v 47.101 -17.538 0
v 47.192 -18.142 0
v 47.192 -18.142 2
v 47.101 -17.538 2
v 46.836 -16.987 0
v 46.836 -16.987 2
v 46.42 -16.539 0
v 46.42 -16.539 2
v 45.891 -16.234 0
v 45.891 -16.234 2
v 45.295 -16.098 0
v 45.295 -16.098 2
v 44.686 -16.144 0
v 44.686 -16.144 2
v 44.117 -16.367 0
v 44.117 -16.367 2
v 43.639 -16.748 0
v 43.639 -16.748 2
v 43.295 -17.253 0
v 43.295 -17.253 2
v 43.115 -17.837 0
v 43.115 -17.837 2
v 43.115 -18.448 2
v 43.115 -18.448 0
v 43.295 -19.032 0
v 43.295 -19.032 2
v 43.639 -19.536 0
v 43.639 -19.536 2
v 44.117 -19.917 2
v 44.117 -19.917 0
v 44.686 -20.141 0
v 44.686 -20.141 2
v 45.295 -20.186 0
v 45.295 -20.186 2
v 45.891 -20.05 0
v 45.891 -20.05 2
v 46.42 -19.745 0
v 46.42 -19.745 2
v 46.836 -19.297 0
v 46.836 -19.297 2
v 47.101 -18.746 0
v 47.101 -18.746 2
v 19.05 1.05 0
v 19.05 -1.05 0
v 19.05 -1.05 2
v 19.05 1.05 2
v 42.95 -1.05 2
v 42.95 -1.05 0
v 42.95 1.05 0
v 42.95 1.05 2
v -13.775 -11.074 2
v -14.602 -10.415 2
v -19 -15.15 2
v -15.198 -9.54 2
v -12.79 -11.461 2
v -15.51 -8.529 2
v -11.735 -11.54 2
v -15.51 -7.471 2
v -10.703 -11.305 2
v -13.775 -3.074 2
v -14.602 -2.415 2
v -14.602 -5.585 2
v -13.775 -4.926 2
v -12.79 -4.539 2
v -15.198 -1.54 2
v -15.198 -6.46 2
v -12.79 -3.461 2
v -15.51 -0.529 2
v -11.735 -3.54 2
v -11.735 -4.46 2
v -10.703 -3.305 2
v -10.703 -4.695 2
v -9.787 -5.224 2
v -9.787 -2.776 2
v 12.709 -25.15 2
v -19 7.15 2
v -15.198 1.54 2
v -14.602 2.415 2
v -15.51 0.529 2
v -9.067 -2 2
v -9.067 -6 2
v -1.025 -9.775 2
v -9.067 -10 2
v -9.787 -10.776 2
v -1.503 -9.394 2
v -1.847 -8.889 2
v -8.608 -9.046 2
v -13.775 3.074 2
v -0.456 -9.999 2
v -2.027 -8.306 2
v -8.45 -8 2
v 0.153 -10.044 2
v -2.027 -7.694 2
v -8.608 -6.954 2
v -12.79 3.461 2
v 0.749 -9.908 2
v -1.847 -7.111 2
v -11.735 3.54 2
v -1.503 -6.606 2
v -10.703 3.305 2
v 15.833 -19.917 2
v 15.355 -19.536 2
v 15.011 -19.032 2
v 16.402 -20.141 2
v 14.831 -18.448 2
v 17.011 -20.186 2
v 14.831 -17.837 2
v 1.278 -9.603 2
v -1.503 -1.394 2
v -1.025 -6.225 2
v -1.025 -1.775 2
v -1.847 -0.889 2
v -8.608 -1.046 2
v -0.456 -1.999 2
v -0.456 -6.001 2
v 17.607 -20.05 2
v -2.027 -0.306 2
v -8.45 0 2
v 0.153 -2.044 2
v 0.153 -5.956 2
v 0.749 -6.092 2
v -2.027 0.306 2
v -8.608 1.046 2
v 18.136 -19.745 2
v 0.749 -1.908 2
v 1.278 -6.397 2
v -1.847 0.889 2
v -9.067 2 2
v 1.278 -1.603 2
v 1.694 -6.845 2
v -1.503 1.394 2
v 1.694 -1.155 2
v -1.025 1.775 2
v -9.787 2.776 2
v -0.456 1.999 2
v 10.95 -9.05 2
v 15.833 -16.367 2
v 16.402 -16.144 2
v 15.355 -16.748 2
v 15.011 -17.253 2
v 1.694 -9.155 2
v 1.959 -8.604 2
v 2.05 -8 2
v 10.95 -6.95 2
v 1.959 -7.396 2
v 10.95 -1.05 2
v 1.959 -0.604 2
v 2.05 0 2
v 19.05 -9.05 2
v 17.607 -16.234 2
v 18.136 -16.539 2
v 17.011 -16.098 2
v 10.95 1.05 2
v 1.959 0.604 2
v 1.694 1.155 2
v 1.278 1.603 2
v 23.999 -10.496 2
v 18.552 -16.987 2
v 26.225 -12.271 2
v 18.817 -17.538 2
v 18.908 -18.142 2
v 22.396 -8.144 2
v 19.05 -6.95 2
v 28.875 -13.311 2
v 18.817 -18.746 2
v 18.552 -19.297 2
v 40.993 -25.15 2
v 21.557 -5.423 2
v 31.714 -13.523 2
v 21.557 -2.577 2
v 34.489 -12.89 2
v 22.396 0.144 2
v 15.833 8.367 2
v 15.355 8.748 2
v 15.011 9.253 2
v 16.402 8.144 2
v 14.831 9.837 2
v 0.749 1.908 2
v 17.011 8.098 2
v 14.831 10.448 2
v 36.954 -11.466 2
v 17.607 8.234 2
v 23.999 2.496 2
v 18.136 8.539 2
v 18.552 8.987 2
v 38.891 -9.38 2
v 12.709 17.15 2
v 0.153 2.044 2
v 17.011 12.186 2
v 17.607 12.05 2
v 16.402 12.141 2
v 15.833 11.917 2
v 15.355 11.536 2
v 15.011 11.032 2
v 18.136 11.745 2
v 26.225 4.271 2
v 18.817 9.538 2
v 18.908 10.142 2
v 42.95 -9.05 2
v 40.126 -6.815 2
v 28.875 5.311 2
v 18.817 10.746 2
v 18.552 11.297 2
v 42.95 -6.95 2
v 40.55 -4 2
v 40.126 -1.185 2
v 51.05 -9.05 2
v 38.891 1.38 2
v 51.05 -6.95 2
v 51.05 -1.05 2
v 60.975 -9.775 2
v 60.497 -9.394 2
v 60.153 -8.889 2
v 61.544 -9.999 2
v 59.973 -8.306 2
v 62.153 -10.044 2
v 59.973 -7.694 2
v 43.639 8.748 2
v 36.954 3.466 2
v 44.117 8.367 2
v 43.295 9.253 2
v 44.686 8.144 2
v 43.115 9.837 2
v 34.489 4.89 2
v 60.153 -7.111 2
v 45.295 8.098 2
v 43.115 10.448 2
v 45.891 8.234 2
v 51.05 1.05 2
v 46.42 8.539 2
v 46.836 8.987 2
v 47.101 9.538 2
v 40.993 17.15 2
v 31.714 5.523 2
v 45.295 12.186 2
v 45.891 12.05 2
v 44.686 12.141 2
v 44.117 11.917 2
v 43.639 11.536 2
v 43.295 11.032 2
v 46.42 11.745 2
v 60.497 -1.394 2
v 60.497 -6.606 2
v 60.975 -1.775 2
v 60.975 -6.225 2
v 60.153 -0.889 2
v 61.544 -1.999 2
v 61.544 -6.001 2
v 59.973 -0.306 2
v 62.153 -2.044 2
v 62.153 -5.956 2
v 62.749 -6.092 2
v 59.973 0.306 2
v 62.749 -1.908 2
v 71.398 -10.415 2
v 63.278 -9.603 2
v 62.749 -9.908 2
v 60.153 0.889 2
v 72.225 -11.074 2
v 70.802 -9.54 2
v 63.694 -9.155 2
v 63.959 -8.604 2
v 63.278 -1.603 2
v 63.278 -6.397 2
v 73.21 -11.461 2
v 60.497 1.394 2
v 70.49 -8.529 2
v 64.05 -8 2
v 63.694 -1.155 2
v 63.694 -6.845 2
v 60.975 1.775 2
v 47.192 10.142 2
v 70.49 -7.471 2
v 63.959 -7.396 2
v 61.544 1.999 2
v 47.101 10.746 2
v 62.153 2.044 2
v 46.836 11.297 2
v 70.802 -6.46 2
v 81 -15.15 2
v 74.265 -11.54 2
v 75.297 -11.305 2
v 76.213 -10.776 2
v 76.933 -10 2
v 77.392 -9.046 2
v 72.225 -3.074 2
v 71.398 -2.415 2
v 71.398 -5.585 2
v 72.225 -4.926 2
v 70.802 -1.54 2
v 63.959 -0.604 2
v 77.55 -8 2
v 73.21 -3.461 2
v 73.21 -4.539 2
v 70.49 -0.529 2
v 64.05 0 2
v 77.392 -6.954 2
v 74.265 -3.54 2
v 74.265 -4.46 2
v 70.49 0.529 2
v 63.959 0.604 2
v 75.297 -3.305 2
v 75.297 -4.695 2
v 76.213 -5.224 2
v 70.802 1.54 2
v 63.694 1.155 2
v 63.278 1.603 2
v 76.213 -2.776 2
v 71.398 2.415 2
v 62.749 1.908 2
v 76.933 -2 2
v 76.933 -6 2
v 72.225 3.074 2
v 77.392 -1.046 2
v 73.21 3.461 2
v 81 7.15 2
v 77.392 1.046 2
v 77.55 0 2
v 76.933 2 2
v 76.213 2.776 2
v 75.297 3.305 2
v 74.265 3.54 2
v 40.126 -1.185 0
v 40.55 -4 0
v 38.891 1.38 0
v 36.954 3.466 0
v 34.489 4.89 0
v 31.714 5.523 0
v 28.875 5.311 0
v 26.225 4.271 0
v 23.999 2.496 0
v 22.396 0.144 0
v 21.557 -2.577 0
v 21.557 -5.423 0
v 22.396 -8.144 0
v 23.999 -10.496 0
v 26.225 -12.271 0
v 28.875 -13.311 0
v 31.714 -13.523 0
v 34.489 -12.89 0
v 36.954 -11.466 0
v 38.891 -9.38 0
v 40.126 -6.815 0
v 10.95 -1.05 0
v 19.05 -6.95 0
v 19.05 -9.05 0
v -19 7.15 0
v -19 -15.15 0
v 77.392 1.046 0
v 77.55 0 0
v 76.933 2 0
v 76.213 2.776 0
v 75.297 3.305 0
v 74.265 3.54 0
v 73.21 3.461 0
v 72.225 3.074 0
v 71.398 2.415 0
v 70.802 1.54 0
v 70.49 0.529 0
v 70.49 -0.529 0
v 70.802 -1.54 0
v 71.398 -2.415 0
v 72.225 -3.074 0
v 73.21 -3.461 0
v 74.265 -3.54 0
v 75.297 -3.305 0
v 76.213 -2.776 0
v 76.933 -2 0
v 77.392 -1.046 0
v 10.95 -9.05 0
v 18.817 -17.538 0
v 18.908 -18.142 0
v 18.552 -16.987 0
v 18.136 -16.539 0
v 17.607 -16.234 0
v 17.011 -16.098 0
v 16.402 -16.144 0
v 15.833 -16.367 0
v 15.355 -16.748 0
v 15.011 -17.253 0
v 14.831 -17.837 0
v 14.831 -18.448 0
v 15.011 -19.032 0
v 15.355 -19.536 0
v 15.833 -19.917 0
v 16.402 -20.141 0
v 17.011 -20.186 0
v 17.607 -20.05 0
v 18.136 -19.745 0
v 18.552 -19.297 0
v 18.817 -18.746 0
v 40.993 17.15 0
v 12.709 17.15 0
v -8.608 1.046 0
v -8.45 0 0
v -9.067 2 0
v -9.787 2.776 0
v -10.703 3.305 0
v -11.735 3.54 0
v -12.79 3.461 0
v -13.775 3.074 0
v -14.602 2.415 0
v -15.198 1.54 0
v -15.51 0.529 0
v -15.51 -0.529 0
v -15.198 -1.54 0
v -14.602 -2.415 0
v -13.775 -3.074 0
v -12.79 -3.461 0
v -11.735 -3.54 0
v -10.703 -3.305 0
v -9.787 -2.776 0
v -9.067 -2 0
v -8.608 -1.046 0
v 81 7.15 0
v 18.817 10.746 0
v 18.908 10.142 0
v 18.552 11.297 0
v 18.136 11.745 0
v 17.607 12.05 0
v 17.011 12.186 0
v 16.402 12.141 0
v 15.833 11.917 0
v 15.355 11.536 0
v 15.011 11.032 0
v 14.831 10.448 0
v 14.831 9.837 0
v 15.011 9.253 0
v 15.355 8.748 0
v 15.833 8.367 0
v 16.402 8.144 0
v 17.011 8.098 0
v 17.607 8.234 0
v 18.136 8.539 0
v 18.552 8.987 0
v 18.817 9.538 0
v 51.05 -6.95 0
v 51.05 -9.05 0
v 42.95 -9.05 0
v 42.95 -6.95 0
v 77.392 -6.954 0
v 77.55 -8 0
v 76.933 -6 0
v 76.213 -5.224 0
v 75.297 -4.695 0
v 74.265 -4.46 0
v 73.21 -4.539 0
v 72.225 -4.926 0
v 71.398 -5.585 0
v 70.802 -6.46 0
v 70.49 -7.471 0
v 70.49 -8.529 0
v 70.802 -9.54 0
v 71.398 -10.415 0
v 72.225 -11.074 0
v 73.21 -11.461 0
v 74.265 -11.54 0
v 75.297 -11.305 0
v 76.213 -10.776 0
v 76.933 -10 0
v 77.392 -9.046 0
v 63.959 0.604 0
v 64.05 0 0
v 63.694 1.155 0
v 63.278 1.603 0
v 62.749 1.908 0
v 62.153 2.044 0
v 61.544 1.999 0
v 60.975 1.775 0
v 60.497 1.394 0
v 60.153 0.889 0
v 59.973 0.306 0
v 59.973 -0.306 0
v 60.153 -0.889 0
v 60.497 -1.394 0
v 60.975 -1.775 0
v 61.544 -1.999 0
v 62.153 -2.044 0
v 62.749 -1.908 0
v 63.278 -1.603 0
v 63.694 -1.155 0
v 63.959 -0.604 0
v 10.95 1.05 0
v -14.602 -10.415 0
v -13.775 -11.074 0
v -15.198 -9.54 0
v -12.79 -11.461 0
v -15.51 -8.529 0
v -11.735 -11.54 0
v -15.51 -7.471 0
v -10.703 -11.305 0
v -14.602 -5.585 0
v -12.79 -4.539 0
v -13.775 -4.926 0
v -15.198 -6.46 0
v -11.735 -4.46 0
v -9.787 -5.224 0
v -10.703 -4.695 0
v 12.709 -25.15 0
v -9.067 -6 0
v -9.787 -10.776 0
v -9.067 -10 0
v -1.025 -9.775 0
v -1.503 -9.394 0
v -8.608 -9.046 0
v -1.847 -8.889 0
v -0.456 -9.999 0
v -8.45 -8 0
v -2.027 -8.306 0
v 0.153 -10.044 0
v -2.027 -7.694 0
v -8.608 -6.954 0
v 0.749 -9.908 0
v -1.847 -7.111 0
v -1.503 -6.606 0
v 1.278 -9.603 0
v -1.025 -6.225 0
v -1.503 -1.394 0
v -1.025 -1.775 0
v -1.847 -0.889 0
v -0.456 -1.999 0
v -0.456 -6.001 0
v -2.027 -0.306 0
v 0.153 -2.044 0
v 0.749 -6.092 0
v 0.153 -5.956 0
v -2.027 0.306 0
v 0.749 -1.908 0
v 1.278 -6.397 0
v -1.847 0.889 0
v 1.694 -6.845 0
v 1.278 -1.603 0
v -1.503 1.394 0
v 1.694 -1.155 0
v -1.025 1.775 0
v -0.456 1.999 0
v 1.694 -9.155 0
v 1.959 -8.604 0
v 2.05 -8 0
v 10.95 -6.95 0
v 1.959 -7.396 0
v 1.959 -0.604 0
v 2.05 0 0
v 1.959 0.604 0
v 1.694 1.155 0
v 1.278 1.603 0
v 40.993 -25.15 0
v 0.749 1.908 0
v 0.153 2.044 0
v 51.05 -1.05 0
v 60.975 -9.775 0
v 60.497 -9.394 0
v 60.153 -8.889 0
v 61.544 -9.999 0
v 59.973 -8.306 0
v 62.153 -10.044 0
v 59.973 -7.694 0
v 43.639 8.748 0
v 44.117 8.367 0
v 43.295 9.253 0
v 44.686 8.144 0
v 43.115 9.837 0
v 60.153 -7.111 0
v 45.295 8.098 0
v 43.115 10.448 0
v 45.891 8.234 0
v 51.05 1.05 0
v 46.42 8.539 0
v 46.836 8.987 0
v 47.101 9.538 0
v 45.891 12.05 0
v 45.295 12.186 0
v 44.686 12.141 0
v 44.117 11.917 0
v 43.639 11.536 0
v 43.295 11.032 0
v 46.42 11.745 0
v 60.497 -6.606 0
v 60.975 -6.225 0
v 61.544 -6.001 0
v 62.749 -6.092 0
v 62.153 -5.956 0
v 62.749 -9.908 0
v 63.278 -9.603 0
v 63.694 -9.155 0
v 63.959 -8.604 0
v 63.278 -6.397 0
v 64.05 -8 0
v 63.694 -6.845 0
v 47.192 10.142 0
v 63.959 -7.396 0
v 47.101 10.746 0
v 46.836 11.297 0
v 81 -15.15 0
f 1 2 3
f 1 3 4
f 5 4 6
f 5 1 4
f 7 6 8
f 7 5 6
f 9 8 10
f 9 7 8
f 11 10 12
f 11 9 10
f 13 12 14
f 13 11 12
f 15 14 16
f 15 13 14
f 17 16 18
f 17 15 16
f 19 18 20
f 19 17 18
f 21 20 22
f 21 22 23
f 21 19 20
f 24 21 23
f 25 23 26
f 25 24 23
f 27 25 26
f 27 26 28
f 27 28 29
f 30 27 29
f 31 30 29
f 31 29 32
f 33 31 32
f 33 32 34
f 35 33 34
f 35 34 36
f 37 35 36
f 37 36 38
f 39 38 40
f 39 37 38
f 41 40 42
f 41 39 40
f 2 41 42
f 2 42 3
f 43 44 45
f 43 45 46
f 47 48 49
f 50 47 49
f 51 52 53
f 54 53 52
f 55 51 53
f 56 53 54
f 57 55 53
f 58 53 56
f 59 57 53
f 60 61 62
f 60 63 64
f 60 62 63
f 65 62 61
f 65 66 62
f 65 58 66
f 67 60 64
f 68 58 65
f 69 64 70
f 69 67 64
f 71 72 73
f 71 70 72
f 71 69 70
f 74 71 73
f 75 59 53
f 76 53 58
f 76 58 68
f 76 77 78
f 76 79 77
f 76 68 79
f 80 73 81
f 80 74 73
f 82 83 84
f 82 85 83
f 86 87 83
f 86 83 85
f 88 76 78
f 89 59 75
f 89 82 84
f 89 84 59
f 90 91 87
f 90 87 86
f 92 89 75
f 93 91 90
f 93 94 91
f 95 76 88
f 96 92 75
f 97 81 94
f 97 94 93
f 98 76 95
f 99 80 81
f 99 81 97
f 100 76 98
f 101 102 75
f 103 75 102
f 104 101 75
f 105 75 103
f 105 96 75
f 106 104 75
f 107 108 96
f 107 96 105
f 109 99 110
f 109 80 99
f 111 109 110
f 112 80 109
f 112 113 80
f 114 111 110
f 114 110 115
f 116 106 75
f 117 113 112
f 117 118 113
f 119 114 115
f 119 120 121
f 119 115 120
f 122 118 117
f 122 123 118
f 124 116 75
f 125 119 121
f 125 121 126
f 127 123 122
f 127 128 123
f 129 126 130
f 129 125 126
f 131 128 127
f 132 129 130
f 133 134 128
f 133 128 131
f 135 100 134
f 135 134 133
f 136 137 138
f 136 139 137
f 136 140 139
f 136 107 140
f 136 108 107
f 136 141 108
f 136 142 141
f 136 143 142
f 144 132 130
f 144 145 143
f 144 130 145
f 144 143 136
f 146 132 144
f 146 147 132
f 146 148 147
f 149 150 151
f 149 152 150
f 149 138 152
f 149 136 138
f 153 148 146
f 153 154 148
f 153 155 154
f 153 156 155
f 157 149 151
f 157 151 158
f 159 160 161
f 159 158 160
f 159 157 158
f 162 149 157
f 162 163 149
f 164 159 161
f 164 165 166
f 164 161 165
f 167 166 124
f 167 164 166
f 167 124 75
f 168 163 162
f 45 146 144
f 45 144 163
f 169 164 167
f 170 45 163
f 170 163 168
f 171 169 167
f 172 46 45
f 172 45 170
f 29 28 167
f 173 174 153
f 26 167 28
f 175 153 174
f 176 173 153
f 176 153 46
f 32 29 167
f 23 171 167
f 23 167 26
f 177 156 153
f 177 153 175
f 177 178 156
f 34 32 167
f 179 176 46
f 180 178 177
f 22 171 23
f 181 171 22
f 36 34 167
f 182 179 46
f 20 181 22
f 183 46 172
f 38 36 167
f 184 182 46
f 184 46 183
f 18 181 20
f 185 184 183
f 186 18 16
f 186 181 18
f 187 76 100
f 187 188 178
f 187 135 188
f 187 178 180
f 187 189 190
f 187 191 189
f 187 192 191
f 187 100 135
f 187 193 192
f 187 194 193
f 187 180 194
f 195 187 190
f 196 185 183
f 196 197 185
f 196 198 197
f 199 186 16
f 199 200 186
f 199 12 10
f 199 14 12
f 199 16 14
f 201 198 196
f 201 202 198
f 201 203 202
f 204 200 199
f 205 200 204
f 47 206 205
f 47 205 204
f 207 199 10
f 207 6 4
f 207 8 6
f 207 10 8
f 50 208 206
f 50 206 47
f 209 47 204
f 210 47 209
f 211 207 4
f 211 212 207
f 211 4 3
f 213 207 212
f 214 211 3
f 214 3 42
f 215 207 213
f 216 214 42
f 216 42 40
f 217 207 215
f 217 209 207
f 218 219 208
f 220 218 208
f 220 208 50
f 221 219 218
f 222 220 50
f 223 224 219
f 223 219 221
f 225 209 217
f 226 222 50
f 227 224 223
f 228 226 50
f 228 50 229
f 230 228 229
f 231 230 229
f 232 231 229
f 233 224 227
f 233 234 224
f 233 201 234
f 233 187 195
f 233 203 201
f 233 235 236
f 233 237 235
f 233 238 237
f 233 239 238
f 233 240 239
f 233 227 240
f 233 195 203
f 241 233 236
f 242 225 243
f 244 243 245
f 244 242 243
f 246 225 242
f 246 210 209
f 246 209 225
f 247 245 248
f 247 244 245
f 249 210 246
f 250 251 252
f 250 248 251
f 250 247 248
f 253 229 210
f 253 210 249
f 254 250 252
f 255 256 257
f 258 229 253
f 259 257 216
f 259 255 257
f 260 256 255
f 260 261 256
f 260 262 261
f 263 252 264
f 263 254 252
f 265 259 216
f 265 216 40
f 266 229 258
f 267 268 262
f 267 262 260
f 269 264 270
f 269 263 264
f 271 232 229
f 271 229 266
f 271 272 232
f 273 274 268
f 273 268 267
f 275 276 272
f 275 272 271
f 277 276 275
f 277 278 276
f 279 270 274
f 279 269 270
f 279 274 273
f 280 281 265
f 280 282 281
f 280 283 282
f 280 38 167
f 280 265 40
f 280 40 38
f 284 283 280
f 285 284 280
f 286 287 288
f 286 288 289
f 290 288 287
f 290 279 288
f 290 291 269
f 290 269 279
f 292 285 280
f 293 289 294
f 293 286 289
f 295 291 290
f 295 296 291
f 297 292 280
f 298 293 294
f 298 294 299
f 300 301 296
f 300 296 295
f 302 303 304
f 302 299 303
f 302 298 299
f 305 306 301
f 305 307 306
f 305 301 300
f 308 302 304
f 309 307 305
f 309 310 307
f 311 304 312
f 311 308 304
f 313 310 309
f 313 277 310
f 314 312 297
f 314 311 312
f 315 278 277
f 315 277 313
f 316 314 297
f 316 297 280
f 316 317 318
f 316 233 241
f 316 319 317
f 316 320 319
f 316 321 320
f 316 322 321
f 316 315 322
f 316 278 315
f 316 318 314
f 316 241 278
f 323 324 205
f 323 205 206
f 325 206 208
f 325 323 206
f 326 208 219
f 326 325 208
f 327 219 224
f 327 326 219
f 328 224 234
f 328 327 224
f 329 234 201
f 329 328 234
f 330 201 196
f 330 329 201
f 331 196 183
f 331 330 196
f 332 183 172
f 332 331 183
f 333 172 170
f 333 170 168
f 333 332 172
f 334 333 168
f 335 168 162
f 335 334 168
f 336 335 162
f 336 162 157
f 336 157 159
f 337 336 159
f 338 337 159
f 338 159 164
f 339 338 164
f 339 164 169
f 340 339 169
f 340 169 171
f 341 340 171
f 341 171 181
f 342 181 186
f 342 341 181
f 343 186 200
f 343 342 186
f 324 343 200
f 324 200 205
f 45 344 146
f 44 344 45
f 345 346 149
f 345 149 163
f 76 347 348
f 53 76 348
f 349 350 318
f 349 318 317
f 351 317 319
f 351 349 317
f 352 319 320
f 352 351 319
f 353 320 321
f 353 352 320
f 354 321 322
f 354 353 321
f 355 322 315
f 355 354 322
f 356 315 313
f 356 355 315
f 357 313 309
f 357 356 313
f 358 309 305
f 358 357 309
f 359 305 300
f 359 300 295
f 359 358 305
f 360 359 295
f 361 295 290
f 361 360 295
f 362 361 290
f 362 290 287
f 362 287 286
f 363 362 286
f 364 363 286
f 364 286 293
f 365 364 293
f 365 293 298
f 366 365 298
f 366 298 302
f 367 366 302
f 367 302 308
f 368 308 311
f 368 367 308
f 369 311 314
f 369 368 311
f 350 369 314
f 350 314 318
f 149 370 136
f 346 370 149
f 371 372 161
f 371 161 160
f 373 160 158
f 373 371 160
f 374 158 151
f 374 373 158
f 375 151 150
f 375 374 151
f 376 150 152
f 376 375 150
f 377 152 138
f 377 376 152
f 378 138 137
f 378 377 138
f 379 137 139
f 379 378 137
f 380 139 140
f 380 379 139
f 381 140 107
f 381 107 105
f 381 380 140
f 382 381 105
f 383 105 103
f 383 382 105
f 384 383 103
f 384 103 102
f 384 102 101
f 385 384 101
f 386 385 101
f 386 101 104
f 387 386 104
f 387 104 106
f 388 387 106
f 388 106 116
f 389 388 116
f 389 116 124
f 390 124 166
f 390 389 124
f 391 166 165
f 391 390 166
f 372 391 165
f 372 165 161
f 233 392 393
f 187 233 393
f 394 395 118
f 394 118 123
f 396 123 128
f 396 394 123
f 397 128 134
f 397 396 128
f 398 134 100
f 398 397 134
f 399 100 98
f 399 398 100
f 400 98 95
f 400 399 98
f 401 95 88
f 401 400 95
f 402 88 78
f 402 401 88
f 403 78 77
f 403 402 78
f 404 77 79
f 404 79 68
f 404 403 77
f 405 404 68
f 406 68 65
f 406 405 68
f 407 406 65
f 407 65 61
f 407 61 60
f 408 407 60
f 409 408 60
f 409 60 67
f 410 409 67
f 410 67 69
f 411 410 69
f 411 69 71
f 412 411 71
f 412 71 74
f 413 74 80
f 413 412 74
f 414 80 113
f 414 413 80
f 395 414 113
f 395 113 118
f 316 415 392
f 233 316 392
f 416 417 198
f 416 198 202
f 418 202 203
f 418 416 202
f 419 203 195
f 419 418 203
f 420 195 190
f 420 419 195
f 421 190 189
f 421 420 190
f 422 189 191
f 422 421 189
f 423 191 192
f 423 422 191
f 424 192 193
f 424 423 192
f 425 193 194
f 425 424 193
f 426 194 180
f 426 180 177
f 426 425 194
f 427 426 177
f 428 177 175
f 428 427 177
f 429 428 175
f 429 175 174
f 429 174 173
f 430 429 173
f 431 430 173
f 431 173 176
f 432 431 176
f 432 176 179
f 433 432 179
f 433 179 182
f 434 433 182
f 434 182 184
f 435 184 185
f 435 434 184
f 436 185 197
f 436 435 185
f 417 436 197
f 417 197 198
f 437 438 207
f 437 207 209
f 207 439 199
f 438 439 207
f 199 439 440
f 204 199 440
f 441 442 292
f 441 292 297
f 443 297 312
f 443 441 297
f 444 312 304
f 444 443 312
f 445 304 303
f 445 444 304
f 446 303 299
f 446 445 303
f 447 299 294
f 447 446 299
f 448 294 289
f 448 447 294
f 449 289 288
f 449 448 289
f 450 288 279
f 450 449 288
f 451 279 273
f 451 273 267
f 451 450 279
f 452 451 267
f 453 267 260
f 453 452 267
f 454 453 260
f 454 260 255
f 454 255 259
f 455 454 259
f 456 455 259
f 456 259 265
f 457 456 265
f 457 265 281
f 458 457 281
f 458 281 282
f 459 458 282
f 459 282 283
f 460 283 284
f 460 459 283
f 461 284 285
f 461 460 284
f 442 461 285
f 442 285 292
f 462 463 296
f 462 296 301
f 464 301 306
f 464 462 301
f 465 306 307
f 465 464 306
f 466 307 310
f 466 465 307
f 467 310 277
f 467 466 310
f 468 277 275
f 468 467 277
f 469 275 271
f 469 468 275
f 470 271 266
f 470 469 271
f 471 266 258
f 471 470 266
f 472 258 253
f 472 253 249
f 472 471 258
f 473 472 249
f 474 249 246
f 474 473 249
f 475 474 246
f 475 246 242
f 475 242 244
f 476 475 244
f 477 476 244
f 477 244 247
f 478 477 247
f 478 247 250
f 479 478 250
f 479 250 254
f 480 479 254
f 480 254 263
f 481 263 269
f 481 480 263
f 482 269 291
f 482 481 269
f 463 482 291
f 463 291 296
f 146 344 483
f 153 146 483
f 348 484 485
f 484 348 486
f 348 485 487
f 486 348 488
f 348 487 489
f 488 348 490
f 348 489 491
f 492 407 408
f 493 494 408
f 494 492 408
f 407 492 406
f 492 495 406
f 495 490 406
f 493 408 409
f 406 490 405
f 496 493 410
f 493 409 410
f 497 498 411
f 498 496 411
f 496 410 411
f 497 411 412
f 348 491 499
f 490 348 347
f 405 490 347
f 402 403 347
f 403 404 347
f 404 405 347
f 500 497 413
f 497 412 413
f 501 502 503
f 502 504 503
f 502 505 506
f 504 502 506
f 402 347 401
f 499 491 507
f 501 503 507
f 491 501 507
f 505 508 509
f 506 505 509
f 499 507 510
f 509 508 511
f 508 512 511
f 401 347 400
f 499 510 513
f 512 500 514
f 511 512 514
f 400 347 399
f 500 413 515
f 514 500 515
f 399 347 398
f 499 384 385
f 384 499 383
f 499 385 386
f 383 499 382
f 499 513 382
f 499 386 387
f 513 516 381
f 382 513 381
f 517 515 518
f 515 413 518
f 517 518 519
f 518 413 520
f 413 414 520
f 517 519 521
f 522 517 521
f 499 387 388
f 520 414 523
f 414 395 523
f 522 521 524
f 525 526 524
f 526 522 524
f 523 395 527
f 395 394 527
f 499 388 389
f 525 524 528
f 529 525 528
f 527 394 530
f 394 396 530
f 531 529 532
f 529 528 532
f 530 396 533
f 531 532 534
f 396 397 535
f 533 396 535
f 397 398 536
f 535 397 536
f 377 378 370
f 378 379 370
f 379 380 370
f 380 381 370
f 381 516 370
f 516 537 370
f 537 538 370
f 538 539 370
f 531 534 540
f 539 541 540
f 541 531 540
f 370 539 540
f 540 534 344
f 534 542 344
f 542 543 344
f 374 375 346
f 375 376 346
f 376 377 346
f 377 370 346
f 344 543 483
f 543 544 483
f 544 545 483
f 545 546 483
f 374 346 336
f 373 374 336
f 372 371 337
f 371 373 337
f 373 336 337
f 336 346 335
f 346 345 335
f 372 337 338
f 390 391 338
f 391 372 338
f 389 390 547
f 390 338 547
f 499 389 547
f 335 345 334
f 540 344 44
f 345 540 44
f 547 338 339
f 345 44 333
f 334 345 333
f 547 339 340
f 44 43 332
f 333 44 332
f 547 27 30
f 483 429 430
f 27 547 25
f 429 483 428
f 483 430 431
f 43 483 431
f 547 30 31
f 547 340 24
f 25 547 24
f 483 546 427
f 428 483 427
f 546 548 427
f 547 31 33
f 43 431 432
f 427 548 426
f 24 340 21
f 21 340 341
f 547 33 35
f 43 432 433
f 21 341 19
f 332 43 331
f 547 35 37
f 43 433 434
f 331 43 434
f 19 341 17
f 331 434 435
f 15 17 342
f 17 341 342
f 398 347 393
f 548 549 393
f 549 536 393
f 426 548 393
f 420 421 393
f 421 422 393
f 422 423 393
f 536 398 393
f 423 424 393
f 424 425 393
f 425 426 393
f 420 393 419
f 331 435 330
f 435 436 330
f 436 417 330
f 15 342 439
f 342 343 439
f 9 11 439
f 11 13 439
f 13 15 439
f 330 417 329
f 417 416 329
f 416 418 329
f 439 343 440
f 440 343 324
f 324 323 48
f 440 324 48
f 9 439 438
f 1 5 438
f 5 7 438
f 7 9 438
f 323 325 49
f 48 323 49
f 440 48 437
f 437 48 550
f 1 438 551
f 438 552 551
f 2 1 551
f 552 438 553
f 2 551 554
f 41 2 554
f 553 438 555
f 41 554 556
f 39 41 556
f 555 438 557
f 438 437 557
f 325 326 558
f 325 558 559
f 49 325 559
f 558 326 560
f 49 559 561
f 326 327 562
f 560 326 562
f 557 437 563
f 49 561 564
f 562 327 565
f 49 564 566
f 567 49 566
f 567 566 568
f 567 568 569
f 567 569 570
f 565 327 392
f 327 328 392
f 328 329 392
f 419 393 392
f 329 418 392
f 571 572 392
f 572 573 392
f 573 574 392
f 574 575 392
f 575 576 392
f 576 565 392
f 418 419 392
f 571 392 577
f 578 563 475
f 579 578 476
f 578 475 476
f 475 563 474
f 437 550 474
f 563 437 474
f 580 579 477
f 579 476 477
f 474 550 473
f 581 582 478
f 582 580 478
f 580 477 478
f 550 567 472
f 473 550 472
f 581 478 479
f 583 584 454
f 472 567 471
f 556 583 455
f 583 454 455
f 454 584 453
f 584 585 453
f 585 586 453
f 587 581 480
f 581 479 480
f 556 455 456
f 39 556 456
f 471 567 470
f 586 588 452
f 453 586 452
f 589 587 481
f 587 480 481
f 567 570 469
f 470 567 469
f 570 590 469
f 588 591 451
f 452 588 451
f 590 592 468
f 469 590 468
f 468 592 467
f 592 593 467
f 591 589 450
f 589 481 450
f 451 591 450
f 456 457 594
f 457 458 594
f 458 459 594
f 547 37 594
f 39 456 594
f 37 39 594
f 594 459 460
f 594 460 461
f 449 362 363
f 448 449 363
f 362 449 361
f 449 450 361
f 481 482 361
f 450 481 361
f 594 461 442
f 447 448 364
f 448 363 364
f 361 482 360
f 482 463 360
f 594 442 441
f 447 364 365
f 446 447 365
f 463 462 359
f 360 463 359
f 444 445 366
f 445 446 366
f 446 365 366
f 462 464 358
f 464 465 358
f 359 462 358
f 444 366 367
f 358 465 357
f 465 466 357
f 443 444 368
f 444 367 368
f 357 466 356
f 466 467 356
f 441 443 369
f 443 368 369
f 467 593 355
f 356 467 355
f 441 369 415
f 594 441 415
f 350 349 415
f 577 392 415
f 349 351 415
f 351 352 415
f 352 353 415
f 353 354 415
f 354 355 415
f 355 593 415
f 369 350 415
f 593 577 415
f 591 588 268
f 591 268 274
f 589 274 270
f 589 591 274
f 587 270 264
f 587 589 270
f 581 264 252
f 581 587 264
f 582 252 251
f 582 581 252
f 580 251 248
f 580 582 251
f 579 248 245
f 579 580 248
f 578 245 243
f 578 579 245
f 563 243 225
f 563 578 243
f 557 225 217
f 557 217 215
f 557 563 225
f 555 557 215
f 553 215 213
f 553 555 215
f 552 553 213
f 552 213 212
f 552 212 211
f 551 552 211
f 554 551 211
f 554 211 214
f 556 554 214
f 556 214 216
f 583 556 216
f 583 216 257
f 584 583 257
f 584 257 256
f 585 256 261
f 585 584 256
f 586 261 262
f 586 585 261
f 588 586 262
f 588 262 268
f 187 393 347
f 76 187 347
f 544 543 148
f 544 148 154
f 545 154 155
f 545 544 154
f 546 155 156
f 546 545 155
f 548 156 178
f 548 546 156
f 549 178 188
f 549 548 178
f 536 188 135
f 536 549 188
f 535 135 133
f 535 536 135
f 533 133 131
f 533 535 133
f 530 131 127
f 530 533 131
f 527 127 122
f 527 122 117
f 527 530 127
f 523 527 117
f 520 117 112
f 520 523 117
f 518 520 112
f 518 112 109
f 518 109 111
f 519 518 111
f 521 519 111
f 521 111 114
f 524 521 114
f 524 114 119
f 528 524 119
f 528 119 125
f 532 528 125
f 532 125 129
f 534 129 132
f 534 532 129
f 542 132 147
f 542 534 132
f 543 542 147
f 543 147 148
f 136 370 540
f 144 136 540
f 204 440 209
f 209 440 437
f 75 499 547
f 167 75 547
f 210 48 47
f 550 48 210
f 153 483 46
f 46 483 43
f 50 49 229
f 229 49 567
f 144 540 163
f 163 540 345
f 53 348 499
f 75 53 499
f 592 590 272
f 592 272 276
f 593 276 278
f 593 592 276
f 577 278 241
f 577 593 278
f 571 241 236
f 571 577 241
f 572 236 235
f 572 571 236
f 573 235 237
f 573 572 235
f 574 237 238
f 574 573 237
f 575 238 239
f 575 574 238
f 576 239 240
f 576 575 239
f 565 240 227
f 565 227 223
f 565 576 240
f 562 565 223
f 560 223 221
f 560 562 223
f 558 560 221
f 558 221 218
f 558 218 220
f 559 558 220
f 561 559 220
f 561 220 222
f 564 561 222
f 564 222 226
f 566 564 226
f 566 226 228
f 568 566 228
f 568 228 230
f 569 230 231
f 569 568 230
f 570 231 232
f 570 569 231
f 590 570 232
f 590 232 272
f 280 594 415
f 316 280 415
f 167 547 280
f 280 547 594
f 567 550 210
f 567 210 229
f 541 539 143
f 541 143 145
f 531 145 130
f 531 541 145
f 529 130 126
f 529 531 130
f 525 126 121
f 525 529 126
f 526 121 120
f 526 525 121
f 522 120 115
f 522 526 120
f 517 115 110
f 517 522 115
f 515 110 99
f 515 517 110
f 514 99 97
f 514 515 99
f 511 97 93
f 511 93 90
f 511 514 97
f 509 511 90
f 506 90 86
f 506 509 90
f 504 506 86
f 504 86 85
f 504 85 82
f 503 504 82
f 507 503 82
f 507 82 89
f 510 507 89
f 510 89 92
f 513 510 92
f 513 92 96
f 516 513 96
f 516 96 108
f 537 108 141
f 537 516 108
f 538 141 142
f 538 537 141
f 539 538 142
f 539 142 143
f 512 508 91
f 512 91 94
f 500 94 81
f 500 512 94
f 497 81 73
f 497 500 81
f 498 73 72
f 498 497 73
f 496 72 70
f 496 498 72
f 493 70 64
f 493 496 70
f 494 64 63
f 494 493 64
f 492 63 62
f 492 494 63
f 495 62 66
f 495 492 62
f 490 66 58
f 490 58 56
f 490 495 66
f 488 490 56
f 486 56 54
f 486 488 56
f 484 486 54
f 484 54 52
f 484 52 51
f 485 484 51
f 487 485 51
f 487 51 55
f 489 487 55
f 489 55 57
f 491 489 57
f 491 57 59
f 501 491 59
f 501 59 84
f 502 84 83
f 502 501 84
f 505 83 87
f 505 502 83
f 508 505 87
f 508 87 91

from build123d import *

# Parameters (mm, degrees)
SKETCH_1_R      = 2.05
SKETCH_1_R_2    = 3.55
SKETCH_1_R_3    = 9.55
SKETCH_1_W      = 8.1
SKETCH_1_H      = 2.1
EXTRUDE_1_DEPTH = 2


with BuildPart() as part:
    # 草图1 → 凸台-拉伸1 (new body)
    with BuildSketch(Plane.XY):
        Polygon((81, -15.149736791), (81, 7.149736791), (40.992999038, 17.149736791), (12.70872779, 17.149736791), (-19, 7.149736791), (-19, -15.149736791), (12.70872779, -25.149736791), (40.992999038, -25.149736791), align=None)
        Circle(SKETCH_1_R, mode=Mode.SUBTRACT)
        with Locations((62, 0)):
            Circle(SKETCH_1_R, mode=Mode.SUBTRACT)
        with Locations((62, -8)):
            Circle(SKETCH_1_R, mode=Mode.SUBTRACT)
        with Locations((0, -8)):
            Circle(SKETCH_1_R, mode=Mode.SUBTRACT)
        with Locations((45.142135624, 10.142135624)):
            Circle(SKETCH_1_R, mode=Mode.SUBTRACT)
        with Locations((45.142135624, -18.142135624)):
            Circle(SKETCH_1_R, mode=Mode.SUBTRACT)
        with Locations((16.857864376, -18.142135624)):
            Circle(SKETCH_1_R, mode=Mode.SUBTRACT)
        with Locations((16.857864376, 10.142135624)):
            Circle(SKETCH_1_R, mode=Mode.SUBTRACT)
        with Locations((74, 0)):
            Circle(SKETCH_1_R_2, mode=Mode.SUBTRACT)
        with Locations((74, -8)):
            Circle(SKETCH_1_R_2, mode=Mode.SUBTRACT)
        with Locations((-12, -8)):
            Circle(SKETCH_1_R_2, mode=Mode.SUBTRACT)
        with Locations((-12, 0)):
            Circle(SKETCH_1_R_2, mode=Mode.SUBTRACT)
        with Locations((31, -4)):
            Circle(SKETCH_1_R_3, mode=Mode.SUBTRACT)
        with Locations((15, 0)):
            Rectangle(SKETCH_1_W, SKETCH_1_H, mode=Mode.SUBTRACT)
        with Locations((47, 0)):
            Rectangle(SKETCH_1_W, SKETCH_1_H, mode=Mode.SUBTRACT)
        with Locations((47, -8)):
            Rectangle(SKETCH_1_W, SKETCH_1_H, mode=Mode.SUBTRACT)
        with Locations((15, -8)):
            Rectangle(SKETCH_1_W, SKETCH_1_H, mode=Mode.SUBTRACT)
    extrude(amount=EXTRUDE_1_DEPTH)


solid = part.part
